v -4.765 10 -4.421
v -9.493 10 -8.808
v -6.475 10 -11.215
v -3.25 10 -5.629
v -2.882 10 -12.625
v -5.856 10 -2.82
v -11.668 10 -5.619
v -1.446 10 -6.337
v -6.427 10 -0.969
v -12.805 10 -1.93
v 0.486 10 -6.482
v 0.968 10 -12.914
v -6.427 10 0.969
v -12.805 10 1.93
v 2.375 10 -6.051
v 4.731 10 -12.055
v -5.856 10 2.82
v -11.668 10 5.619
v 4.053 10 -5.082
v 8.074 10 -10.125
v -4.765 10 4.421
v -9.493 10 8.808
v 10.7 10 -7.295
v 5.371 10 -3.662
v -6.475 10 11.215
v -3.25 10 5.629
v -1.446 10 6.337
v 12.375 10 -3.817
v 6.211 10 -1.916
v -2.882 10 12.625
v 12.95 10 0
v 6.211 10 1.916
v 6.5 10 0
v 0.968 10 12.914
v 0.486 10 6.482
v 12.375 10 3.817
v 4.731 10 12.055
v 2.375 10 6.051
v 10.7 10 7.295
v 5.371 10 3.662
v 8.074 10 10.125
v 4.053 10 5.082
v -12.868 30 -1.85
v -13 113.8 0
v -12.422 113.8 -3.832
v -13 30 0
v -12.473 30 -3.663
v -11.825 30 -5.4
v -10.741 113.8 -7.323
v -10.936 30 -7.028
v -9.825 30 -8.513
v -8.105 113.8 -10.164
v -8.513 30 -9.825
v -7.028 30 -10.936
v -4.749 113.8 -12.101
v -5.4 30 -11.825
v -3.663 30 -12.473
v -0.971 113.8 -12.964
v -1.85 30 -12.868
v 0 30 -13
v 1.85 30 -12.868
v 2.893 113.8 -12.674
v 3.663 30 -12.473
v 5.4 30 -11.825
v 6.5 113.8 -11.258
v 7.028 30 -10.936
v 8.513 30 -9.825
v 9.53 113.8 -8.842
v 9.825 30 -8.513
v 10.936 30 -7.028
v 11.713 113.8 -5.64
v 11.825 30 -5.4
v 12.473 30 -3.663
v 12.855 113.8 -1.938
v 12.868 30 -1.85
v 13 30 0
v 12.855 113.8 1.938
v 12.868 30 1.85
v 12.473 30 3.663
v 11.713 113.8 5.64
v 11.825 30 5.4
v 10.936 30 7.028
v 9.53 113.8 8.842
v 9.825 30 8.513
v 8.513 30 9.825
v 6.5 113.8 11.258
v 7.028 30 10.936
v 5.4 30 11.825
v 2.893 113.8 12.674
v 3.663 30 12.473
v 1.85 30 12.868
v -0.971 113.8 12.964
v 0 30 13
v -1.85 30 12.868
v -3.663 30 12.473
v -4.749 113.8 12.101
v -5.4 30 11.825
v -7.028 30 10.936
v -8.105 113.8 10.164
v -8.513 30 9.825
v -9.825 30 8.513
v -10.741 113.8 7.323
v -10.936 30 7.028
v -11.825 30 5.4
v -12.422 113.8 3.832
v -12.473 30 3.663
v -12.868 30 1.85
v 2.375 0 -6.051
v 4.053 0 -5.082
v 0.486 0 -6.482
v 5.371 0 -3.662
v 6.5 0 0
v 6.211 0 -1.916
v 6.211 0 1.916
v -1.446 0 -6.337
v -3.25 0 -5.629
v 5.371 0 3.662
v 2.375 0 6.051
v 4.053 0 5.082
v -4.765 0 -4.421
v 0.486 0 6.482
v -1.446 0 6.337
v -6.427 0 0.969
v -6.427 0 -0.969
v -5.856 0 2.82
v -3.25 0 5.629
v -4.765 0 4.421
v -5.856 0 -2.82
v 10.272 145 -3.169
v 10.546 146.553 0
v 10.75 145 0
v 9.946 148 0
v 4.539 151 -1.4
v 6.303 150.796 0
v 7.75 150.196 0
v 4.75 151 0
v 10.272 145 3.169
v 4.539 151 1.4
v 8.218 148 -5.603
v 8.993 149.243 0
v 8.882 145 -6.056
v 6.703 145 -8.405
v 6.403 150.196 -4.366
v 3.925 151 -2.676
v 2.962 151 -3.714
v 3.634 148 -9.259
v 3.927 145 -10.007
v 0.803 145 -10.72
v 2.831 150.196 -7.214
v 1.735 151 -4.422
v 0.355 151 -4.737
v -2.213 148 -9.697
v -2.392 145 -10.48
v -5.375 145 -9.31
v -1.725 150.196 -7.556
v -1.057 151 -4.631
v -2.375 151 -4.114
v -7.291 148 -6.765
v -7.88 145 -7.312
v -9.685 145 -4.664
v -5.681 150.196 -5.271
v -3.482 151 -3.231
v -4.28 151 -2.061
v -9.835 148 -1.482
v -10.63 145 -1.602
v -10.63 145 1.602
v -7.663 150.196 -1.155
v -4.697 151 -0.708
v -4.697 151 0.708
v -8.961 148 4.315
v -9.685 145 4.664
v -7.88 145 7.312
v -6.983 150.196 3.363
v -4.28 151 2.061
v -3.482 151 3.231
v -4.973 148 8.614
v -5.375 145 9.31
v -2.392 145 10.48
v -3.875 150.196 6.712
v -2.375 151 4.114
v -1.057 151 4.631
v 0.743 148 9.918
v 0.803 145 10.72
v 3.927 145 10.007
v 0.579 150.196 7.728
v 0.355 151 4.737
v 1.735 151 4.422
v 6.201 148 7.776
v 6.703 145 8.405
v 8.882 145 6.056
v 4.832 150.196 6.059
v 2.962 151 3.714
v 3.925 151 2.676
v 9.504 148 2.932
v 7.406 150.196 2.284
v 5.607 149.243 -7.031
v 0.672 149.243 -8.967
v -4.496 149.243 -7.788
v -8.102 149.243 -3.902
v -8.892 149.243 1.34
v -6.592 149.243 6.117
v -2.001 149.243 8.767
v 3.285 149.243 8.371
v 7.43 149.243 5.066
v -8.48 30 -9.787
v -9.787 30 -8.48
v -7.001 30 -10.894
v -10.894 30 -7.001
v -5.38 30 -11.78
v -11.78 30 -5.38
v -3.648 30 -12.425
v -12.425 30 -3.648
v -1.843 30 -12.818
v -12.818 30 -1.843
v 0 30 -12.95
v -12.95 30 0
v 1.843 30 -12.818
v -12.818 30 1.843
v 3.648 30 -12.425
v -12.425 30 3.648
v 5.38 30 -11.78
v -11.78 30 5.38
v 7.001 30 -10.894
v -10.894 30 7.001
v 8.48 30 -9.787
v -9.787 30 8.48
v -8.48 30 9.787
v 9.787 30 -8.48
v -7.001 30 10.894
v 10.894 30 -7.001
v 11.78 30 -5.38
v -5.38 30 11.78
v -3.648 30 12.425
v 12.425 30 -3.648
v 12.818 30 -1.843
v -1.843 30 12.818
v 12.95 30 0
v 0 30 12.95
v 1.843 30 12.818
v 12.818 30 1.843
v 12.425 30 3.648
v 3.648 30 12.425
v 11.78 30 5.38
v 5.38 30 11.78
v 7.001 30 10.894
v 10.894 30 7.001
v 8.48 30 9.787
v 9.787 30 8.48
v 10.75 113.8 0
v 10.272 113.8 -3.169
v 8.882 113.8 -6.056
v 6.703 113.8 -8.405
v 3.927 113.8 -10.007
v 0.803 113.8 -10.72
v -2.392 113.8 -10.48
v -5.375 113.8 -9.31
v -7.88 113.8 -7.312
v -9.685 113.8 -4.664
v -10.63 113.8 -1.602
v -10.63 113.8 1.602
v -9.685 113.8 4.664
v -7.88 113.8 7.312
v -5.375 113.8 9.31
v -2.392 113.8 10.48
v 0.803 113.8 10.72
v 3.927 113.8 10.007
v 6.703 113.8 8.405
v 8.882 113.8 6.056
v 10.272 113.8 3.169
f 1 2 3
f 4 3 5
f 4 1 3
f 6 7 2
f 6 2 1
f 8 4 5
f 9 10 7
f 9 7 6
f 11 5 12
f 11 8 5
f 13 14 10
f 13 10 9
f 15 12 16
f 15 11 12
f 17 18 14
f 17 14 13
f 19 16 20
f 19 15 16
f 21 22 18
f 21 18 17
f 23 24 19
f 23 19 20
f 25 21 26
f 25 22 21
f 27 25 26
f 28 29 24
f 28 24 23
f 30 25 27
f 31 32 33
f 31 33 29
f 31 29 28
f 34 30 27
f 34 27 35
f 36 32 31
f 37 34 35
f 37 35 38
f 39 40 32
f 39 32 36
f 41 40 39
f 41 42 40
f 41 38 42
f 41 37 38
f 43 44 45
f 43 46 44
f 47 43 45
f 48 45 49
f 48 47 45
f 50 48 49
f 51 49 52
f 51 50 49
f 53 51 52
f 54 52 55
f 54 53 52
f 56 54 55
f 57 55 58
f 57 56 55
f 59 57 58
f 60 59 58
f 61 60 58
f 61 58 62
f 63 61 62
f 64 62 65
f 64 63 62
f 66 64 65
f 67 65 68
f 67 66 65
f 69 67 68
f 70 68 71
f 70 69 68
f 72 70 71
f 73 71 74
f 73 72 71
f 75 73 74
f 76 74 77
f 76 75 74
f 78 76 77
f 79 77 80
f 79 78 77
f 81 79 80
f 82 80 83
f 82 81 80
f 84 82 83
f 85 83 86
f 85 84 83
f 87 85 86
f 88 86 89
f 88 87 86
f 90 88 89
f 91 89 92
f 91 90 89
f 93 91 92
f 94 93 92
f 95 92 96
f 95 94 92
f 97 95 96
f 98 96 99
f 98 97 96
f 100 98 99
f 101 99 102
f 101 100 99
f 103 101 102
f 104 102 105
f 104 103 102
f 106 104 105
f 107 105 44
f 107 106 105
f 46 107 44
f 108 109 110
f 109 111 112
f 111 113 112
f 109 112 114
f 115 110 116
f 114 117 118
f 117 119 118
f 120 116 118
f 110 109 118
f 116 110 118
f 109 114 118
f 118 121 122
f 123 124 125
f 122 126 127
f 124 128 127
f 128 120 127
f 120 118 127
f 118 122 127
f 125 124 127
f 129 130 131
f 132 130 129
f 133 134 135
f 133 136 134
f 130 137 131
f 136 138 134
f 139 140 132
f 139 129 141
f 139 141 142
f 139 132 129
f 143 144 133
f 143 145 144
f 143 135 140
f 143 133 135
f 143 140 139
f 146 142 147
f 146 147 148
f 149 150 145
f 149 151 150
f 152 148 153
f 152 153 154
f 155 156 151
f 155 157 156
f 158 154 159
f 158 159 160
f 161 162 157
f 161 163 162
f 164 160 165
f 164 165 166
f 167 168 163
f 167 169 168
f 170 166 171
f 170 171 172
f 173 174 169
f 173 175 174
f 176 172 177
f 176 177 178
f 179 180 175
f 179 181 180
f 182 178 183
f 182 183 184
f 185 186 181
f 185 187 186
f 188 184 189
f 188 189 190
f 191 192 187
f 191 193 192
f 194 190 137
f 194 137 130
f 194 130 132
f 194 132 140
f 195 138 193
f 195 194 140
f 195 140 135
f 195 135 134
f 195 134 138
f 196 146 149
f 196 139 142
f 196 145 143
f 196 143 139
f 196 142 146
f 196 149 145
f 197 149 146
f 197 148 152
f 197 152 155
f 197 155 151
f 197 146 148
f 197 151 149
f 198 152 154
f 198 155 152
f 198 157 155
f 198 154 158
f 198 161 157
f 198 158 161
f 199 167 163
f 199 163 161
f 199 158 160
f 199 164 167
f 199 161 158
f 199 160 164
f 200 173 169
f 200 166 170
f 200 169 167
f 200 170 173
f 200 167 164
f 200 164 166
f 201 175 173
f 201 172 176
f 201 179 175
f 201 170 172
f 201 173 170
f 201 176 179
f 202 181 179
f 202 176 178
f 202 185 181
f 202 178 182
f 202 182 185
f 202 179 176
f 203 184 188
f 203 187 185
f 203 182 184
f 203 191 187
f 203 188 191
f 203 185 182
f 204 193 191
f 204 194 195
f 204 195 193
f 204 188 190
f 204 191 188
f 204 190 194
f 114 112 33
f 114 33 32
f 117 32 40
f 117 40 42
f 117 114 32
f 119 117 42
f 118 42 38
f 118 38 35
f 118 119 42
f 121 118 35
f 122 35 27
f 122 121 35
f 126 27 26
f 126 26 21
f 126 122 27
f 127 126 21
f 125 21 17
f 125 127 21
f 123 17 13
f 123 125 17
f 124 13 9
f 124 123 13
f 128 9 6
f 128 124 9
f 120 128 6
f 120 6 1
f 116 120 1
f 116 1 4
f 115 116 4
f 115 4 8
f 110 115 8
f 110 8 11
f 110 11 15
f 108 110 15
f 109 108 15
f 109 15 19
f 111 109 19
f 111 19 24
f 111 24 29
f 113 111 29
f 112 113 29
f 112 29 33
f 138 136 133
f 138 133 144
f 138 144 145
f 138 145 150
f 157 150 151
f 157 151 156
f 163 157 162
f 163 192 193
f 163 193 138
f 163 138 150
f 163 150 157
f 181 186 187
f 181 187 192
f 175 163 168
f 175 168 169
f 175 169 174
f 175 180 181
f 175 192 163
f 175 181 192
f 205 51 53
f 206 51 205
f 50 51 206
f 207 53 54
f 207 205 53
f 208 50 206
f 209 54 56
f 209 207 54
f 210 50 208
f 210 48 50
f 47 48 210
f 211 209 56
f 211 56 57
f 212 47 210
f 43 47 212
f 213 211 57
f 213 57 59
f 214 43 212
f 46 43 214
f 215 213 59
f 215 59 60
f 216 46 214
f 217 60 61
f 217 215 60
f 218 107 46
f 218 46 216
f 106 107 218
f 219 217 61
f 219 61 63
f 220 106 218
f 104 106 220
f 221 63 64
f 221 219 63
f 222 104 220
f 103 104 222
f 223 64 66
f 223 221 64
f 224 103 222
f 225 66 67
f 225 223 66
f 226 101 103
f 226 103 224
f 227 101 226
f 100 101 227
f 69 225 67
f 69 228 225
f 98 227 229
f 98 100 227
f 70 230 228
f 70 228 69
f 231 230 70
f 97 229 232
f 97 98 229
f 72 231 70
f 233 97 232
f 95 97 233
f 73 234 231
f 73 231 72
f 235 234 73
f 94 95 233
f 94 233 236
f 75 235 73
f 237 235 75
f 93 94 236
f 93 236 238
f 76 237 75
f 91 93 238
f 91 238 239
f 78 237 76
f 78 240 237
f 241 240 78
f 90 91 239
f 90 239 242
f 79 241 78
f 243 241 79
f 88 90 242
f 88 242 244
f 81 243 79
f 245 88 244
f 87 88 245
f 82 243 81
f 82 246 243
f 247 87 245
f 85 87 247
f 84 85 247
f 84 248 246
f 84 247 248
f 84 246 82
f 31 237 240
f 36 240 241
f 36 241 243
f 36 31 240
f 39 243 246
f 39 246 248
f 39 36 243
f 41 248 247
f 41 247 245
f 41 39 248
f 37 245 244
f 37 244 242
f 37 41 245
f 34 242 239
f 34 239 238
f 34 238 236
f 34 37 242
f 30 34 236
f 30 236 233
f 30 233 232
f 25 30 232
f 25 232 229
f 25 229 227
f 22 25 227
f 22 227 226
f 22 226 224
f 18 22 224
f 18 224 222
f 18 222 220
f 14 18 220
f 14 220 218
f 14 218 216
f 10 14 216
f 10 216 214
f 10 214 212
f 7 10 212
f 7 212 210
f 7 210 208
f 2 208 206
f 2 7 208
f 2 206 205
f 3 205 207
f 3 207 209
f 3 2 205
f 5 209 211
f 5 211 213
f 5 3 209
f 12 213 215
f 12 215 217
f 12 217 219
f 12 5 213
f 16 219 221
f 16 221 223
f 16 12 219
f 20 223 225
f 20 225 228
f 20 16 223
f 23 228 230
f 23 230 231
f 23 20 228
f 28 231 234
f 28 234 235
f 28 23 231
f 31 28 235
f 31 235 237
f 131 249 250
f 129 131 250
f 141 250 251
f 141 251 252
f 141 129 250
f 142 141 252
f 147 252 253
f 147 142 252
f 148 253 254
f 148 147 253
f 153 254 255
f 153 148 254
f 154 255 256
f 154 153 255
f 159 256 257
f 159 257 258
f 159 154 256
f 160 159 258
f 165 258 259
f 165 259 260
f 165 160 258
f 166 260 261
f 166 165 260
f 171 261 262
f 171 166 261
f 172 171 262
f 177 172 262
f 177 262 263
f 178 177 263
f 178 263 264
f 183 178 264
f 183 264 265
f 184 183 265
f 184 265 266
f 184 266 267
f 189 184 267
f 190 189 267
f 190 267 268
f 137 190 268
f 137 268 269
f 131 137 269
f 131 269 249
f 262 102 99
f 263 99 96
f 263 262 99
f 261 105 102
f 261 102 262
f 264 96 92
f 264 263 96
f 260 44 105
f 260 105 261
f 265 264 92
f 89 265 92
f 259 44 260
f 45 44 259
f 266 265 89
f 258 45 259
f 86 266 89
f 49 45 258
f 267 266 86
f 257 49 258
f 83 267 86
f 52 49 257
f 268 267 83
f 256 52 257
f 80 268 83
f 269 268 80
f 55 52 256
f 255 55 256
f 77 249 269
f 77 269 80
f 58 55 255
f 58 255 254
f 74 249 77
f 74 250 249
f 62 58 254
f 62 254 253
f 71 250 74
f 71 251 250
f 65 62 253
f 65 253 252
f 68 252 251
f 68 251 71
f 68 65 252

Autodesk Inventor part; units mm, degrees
ref_plane "YZ Plane" through (0, 0, 0) normal (1, 0, 0) x (0, 1, 0)
ref_plane "XZ Plane" through (0, 0, 0) normal (0, 1, 0) x (-1, 0, 0)
ref_plane "XY Plane" through (0, 0, 0) normal (0, 0, 1) x (1, 0, 0)
sketch "Boceto1" plane through (0, 0, 0) normal (0, 1, 0) x (-1, 0, 0)
  circle A0 centre (0, 0) radius 13
  dimension "d0" = 26
extrude "Extrusión1" add sketch "Boceto1" along normal blind 151
sketch "Boceto2" plane through (0, 151, 0) normal (0, 1, 0) x (1, 0, 0)
  circle A0 centre (0, 0) radius 10.75
  circle A1 centre (0, 0) radius 13
  dimension "d3" = 21.5
extrude "Extrusión2" cut sketch "Boceto2" against normal blind 37.2
fillet "Empalme1" radius 6 1 edges at (-10.75, 151, 0)
thread "Rosca1" size "3/4" designation "3/4 - 14 NPT" standard "NPT" length 31.2 offset 25
sketch "Boceto3" plane through (0, 0, 0) normal (0, -1, 0) x (1, 0, 0)
  circle A0 centre (0, 0) radius 6.5
  circle A1 centre (0, 0) radius 13
  dimension "d9" = 13
extrude "Extrusión3" cut sketch "Boceto3" against normal blind 10
sketch "Boceto4" plane through (0, 10, 0) normal (0, -1, 0) x (1, 0, 0)
  circle A0 centre (0, 0) radius 13
  circle A1 centre (0, 0) radius 12.95
  dimension "d12" = 25.9
extrude "Extrusión4" cut sketch "Boceto4" against normal blind 20
thread "Rosca2" size "1/4" designation "1/4 - 18 NPT" standard "NPT" length 15.103
thread "Rosca3" size "1" designation "1 - 11.5 NPT" standard "NPT" length 25.006 offset 1
properties part number "W504"
